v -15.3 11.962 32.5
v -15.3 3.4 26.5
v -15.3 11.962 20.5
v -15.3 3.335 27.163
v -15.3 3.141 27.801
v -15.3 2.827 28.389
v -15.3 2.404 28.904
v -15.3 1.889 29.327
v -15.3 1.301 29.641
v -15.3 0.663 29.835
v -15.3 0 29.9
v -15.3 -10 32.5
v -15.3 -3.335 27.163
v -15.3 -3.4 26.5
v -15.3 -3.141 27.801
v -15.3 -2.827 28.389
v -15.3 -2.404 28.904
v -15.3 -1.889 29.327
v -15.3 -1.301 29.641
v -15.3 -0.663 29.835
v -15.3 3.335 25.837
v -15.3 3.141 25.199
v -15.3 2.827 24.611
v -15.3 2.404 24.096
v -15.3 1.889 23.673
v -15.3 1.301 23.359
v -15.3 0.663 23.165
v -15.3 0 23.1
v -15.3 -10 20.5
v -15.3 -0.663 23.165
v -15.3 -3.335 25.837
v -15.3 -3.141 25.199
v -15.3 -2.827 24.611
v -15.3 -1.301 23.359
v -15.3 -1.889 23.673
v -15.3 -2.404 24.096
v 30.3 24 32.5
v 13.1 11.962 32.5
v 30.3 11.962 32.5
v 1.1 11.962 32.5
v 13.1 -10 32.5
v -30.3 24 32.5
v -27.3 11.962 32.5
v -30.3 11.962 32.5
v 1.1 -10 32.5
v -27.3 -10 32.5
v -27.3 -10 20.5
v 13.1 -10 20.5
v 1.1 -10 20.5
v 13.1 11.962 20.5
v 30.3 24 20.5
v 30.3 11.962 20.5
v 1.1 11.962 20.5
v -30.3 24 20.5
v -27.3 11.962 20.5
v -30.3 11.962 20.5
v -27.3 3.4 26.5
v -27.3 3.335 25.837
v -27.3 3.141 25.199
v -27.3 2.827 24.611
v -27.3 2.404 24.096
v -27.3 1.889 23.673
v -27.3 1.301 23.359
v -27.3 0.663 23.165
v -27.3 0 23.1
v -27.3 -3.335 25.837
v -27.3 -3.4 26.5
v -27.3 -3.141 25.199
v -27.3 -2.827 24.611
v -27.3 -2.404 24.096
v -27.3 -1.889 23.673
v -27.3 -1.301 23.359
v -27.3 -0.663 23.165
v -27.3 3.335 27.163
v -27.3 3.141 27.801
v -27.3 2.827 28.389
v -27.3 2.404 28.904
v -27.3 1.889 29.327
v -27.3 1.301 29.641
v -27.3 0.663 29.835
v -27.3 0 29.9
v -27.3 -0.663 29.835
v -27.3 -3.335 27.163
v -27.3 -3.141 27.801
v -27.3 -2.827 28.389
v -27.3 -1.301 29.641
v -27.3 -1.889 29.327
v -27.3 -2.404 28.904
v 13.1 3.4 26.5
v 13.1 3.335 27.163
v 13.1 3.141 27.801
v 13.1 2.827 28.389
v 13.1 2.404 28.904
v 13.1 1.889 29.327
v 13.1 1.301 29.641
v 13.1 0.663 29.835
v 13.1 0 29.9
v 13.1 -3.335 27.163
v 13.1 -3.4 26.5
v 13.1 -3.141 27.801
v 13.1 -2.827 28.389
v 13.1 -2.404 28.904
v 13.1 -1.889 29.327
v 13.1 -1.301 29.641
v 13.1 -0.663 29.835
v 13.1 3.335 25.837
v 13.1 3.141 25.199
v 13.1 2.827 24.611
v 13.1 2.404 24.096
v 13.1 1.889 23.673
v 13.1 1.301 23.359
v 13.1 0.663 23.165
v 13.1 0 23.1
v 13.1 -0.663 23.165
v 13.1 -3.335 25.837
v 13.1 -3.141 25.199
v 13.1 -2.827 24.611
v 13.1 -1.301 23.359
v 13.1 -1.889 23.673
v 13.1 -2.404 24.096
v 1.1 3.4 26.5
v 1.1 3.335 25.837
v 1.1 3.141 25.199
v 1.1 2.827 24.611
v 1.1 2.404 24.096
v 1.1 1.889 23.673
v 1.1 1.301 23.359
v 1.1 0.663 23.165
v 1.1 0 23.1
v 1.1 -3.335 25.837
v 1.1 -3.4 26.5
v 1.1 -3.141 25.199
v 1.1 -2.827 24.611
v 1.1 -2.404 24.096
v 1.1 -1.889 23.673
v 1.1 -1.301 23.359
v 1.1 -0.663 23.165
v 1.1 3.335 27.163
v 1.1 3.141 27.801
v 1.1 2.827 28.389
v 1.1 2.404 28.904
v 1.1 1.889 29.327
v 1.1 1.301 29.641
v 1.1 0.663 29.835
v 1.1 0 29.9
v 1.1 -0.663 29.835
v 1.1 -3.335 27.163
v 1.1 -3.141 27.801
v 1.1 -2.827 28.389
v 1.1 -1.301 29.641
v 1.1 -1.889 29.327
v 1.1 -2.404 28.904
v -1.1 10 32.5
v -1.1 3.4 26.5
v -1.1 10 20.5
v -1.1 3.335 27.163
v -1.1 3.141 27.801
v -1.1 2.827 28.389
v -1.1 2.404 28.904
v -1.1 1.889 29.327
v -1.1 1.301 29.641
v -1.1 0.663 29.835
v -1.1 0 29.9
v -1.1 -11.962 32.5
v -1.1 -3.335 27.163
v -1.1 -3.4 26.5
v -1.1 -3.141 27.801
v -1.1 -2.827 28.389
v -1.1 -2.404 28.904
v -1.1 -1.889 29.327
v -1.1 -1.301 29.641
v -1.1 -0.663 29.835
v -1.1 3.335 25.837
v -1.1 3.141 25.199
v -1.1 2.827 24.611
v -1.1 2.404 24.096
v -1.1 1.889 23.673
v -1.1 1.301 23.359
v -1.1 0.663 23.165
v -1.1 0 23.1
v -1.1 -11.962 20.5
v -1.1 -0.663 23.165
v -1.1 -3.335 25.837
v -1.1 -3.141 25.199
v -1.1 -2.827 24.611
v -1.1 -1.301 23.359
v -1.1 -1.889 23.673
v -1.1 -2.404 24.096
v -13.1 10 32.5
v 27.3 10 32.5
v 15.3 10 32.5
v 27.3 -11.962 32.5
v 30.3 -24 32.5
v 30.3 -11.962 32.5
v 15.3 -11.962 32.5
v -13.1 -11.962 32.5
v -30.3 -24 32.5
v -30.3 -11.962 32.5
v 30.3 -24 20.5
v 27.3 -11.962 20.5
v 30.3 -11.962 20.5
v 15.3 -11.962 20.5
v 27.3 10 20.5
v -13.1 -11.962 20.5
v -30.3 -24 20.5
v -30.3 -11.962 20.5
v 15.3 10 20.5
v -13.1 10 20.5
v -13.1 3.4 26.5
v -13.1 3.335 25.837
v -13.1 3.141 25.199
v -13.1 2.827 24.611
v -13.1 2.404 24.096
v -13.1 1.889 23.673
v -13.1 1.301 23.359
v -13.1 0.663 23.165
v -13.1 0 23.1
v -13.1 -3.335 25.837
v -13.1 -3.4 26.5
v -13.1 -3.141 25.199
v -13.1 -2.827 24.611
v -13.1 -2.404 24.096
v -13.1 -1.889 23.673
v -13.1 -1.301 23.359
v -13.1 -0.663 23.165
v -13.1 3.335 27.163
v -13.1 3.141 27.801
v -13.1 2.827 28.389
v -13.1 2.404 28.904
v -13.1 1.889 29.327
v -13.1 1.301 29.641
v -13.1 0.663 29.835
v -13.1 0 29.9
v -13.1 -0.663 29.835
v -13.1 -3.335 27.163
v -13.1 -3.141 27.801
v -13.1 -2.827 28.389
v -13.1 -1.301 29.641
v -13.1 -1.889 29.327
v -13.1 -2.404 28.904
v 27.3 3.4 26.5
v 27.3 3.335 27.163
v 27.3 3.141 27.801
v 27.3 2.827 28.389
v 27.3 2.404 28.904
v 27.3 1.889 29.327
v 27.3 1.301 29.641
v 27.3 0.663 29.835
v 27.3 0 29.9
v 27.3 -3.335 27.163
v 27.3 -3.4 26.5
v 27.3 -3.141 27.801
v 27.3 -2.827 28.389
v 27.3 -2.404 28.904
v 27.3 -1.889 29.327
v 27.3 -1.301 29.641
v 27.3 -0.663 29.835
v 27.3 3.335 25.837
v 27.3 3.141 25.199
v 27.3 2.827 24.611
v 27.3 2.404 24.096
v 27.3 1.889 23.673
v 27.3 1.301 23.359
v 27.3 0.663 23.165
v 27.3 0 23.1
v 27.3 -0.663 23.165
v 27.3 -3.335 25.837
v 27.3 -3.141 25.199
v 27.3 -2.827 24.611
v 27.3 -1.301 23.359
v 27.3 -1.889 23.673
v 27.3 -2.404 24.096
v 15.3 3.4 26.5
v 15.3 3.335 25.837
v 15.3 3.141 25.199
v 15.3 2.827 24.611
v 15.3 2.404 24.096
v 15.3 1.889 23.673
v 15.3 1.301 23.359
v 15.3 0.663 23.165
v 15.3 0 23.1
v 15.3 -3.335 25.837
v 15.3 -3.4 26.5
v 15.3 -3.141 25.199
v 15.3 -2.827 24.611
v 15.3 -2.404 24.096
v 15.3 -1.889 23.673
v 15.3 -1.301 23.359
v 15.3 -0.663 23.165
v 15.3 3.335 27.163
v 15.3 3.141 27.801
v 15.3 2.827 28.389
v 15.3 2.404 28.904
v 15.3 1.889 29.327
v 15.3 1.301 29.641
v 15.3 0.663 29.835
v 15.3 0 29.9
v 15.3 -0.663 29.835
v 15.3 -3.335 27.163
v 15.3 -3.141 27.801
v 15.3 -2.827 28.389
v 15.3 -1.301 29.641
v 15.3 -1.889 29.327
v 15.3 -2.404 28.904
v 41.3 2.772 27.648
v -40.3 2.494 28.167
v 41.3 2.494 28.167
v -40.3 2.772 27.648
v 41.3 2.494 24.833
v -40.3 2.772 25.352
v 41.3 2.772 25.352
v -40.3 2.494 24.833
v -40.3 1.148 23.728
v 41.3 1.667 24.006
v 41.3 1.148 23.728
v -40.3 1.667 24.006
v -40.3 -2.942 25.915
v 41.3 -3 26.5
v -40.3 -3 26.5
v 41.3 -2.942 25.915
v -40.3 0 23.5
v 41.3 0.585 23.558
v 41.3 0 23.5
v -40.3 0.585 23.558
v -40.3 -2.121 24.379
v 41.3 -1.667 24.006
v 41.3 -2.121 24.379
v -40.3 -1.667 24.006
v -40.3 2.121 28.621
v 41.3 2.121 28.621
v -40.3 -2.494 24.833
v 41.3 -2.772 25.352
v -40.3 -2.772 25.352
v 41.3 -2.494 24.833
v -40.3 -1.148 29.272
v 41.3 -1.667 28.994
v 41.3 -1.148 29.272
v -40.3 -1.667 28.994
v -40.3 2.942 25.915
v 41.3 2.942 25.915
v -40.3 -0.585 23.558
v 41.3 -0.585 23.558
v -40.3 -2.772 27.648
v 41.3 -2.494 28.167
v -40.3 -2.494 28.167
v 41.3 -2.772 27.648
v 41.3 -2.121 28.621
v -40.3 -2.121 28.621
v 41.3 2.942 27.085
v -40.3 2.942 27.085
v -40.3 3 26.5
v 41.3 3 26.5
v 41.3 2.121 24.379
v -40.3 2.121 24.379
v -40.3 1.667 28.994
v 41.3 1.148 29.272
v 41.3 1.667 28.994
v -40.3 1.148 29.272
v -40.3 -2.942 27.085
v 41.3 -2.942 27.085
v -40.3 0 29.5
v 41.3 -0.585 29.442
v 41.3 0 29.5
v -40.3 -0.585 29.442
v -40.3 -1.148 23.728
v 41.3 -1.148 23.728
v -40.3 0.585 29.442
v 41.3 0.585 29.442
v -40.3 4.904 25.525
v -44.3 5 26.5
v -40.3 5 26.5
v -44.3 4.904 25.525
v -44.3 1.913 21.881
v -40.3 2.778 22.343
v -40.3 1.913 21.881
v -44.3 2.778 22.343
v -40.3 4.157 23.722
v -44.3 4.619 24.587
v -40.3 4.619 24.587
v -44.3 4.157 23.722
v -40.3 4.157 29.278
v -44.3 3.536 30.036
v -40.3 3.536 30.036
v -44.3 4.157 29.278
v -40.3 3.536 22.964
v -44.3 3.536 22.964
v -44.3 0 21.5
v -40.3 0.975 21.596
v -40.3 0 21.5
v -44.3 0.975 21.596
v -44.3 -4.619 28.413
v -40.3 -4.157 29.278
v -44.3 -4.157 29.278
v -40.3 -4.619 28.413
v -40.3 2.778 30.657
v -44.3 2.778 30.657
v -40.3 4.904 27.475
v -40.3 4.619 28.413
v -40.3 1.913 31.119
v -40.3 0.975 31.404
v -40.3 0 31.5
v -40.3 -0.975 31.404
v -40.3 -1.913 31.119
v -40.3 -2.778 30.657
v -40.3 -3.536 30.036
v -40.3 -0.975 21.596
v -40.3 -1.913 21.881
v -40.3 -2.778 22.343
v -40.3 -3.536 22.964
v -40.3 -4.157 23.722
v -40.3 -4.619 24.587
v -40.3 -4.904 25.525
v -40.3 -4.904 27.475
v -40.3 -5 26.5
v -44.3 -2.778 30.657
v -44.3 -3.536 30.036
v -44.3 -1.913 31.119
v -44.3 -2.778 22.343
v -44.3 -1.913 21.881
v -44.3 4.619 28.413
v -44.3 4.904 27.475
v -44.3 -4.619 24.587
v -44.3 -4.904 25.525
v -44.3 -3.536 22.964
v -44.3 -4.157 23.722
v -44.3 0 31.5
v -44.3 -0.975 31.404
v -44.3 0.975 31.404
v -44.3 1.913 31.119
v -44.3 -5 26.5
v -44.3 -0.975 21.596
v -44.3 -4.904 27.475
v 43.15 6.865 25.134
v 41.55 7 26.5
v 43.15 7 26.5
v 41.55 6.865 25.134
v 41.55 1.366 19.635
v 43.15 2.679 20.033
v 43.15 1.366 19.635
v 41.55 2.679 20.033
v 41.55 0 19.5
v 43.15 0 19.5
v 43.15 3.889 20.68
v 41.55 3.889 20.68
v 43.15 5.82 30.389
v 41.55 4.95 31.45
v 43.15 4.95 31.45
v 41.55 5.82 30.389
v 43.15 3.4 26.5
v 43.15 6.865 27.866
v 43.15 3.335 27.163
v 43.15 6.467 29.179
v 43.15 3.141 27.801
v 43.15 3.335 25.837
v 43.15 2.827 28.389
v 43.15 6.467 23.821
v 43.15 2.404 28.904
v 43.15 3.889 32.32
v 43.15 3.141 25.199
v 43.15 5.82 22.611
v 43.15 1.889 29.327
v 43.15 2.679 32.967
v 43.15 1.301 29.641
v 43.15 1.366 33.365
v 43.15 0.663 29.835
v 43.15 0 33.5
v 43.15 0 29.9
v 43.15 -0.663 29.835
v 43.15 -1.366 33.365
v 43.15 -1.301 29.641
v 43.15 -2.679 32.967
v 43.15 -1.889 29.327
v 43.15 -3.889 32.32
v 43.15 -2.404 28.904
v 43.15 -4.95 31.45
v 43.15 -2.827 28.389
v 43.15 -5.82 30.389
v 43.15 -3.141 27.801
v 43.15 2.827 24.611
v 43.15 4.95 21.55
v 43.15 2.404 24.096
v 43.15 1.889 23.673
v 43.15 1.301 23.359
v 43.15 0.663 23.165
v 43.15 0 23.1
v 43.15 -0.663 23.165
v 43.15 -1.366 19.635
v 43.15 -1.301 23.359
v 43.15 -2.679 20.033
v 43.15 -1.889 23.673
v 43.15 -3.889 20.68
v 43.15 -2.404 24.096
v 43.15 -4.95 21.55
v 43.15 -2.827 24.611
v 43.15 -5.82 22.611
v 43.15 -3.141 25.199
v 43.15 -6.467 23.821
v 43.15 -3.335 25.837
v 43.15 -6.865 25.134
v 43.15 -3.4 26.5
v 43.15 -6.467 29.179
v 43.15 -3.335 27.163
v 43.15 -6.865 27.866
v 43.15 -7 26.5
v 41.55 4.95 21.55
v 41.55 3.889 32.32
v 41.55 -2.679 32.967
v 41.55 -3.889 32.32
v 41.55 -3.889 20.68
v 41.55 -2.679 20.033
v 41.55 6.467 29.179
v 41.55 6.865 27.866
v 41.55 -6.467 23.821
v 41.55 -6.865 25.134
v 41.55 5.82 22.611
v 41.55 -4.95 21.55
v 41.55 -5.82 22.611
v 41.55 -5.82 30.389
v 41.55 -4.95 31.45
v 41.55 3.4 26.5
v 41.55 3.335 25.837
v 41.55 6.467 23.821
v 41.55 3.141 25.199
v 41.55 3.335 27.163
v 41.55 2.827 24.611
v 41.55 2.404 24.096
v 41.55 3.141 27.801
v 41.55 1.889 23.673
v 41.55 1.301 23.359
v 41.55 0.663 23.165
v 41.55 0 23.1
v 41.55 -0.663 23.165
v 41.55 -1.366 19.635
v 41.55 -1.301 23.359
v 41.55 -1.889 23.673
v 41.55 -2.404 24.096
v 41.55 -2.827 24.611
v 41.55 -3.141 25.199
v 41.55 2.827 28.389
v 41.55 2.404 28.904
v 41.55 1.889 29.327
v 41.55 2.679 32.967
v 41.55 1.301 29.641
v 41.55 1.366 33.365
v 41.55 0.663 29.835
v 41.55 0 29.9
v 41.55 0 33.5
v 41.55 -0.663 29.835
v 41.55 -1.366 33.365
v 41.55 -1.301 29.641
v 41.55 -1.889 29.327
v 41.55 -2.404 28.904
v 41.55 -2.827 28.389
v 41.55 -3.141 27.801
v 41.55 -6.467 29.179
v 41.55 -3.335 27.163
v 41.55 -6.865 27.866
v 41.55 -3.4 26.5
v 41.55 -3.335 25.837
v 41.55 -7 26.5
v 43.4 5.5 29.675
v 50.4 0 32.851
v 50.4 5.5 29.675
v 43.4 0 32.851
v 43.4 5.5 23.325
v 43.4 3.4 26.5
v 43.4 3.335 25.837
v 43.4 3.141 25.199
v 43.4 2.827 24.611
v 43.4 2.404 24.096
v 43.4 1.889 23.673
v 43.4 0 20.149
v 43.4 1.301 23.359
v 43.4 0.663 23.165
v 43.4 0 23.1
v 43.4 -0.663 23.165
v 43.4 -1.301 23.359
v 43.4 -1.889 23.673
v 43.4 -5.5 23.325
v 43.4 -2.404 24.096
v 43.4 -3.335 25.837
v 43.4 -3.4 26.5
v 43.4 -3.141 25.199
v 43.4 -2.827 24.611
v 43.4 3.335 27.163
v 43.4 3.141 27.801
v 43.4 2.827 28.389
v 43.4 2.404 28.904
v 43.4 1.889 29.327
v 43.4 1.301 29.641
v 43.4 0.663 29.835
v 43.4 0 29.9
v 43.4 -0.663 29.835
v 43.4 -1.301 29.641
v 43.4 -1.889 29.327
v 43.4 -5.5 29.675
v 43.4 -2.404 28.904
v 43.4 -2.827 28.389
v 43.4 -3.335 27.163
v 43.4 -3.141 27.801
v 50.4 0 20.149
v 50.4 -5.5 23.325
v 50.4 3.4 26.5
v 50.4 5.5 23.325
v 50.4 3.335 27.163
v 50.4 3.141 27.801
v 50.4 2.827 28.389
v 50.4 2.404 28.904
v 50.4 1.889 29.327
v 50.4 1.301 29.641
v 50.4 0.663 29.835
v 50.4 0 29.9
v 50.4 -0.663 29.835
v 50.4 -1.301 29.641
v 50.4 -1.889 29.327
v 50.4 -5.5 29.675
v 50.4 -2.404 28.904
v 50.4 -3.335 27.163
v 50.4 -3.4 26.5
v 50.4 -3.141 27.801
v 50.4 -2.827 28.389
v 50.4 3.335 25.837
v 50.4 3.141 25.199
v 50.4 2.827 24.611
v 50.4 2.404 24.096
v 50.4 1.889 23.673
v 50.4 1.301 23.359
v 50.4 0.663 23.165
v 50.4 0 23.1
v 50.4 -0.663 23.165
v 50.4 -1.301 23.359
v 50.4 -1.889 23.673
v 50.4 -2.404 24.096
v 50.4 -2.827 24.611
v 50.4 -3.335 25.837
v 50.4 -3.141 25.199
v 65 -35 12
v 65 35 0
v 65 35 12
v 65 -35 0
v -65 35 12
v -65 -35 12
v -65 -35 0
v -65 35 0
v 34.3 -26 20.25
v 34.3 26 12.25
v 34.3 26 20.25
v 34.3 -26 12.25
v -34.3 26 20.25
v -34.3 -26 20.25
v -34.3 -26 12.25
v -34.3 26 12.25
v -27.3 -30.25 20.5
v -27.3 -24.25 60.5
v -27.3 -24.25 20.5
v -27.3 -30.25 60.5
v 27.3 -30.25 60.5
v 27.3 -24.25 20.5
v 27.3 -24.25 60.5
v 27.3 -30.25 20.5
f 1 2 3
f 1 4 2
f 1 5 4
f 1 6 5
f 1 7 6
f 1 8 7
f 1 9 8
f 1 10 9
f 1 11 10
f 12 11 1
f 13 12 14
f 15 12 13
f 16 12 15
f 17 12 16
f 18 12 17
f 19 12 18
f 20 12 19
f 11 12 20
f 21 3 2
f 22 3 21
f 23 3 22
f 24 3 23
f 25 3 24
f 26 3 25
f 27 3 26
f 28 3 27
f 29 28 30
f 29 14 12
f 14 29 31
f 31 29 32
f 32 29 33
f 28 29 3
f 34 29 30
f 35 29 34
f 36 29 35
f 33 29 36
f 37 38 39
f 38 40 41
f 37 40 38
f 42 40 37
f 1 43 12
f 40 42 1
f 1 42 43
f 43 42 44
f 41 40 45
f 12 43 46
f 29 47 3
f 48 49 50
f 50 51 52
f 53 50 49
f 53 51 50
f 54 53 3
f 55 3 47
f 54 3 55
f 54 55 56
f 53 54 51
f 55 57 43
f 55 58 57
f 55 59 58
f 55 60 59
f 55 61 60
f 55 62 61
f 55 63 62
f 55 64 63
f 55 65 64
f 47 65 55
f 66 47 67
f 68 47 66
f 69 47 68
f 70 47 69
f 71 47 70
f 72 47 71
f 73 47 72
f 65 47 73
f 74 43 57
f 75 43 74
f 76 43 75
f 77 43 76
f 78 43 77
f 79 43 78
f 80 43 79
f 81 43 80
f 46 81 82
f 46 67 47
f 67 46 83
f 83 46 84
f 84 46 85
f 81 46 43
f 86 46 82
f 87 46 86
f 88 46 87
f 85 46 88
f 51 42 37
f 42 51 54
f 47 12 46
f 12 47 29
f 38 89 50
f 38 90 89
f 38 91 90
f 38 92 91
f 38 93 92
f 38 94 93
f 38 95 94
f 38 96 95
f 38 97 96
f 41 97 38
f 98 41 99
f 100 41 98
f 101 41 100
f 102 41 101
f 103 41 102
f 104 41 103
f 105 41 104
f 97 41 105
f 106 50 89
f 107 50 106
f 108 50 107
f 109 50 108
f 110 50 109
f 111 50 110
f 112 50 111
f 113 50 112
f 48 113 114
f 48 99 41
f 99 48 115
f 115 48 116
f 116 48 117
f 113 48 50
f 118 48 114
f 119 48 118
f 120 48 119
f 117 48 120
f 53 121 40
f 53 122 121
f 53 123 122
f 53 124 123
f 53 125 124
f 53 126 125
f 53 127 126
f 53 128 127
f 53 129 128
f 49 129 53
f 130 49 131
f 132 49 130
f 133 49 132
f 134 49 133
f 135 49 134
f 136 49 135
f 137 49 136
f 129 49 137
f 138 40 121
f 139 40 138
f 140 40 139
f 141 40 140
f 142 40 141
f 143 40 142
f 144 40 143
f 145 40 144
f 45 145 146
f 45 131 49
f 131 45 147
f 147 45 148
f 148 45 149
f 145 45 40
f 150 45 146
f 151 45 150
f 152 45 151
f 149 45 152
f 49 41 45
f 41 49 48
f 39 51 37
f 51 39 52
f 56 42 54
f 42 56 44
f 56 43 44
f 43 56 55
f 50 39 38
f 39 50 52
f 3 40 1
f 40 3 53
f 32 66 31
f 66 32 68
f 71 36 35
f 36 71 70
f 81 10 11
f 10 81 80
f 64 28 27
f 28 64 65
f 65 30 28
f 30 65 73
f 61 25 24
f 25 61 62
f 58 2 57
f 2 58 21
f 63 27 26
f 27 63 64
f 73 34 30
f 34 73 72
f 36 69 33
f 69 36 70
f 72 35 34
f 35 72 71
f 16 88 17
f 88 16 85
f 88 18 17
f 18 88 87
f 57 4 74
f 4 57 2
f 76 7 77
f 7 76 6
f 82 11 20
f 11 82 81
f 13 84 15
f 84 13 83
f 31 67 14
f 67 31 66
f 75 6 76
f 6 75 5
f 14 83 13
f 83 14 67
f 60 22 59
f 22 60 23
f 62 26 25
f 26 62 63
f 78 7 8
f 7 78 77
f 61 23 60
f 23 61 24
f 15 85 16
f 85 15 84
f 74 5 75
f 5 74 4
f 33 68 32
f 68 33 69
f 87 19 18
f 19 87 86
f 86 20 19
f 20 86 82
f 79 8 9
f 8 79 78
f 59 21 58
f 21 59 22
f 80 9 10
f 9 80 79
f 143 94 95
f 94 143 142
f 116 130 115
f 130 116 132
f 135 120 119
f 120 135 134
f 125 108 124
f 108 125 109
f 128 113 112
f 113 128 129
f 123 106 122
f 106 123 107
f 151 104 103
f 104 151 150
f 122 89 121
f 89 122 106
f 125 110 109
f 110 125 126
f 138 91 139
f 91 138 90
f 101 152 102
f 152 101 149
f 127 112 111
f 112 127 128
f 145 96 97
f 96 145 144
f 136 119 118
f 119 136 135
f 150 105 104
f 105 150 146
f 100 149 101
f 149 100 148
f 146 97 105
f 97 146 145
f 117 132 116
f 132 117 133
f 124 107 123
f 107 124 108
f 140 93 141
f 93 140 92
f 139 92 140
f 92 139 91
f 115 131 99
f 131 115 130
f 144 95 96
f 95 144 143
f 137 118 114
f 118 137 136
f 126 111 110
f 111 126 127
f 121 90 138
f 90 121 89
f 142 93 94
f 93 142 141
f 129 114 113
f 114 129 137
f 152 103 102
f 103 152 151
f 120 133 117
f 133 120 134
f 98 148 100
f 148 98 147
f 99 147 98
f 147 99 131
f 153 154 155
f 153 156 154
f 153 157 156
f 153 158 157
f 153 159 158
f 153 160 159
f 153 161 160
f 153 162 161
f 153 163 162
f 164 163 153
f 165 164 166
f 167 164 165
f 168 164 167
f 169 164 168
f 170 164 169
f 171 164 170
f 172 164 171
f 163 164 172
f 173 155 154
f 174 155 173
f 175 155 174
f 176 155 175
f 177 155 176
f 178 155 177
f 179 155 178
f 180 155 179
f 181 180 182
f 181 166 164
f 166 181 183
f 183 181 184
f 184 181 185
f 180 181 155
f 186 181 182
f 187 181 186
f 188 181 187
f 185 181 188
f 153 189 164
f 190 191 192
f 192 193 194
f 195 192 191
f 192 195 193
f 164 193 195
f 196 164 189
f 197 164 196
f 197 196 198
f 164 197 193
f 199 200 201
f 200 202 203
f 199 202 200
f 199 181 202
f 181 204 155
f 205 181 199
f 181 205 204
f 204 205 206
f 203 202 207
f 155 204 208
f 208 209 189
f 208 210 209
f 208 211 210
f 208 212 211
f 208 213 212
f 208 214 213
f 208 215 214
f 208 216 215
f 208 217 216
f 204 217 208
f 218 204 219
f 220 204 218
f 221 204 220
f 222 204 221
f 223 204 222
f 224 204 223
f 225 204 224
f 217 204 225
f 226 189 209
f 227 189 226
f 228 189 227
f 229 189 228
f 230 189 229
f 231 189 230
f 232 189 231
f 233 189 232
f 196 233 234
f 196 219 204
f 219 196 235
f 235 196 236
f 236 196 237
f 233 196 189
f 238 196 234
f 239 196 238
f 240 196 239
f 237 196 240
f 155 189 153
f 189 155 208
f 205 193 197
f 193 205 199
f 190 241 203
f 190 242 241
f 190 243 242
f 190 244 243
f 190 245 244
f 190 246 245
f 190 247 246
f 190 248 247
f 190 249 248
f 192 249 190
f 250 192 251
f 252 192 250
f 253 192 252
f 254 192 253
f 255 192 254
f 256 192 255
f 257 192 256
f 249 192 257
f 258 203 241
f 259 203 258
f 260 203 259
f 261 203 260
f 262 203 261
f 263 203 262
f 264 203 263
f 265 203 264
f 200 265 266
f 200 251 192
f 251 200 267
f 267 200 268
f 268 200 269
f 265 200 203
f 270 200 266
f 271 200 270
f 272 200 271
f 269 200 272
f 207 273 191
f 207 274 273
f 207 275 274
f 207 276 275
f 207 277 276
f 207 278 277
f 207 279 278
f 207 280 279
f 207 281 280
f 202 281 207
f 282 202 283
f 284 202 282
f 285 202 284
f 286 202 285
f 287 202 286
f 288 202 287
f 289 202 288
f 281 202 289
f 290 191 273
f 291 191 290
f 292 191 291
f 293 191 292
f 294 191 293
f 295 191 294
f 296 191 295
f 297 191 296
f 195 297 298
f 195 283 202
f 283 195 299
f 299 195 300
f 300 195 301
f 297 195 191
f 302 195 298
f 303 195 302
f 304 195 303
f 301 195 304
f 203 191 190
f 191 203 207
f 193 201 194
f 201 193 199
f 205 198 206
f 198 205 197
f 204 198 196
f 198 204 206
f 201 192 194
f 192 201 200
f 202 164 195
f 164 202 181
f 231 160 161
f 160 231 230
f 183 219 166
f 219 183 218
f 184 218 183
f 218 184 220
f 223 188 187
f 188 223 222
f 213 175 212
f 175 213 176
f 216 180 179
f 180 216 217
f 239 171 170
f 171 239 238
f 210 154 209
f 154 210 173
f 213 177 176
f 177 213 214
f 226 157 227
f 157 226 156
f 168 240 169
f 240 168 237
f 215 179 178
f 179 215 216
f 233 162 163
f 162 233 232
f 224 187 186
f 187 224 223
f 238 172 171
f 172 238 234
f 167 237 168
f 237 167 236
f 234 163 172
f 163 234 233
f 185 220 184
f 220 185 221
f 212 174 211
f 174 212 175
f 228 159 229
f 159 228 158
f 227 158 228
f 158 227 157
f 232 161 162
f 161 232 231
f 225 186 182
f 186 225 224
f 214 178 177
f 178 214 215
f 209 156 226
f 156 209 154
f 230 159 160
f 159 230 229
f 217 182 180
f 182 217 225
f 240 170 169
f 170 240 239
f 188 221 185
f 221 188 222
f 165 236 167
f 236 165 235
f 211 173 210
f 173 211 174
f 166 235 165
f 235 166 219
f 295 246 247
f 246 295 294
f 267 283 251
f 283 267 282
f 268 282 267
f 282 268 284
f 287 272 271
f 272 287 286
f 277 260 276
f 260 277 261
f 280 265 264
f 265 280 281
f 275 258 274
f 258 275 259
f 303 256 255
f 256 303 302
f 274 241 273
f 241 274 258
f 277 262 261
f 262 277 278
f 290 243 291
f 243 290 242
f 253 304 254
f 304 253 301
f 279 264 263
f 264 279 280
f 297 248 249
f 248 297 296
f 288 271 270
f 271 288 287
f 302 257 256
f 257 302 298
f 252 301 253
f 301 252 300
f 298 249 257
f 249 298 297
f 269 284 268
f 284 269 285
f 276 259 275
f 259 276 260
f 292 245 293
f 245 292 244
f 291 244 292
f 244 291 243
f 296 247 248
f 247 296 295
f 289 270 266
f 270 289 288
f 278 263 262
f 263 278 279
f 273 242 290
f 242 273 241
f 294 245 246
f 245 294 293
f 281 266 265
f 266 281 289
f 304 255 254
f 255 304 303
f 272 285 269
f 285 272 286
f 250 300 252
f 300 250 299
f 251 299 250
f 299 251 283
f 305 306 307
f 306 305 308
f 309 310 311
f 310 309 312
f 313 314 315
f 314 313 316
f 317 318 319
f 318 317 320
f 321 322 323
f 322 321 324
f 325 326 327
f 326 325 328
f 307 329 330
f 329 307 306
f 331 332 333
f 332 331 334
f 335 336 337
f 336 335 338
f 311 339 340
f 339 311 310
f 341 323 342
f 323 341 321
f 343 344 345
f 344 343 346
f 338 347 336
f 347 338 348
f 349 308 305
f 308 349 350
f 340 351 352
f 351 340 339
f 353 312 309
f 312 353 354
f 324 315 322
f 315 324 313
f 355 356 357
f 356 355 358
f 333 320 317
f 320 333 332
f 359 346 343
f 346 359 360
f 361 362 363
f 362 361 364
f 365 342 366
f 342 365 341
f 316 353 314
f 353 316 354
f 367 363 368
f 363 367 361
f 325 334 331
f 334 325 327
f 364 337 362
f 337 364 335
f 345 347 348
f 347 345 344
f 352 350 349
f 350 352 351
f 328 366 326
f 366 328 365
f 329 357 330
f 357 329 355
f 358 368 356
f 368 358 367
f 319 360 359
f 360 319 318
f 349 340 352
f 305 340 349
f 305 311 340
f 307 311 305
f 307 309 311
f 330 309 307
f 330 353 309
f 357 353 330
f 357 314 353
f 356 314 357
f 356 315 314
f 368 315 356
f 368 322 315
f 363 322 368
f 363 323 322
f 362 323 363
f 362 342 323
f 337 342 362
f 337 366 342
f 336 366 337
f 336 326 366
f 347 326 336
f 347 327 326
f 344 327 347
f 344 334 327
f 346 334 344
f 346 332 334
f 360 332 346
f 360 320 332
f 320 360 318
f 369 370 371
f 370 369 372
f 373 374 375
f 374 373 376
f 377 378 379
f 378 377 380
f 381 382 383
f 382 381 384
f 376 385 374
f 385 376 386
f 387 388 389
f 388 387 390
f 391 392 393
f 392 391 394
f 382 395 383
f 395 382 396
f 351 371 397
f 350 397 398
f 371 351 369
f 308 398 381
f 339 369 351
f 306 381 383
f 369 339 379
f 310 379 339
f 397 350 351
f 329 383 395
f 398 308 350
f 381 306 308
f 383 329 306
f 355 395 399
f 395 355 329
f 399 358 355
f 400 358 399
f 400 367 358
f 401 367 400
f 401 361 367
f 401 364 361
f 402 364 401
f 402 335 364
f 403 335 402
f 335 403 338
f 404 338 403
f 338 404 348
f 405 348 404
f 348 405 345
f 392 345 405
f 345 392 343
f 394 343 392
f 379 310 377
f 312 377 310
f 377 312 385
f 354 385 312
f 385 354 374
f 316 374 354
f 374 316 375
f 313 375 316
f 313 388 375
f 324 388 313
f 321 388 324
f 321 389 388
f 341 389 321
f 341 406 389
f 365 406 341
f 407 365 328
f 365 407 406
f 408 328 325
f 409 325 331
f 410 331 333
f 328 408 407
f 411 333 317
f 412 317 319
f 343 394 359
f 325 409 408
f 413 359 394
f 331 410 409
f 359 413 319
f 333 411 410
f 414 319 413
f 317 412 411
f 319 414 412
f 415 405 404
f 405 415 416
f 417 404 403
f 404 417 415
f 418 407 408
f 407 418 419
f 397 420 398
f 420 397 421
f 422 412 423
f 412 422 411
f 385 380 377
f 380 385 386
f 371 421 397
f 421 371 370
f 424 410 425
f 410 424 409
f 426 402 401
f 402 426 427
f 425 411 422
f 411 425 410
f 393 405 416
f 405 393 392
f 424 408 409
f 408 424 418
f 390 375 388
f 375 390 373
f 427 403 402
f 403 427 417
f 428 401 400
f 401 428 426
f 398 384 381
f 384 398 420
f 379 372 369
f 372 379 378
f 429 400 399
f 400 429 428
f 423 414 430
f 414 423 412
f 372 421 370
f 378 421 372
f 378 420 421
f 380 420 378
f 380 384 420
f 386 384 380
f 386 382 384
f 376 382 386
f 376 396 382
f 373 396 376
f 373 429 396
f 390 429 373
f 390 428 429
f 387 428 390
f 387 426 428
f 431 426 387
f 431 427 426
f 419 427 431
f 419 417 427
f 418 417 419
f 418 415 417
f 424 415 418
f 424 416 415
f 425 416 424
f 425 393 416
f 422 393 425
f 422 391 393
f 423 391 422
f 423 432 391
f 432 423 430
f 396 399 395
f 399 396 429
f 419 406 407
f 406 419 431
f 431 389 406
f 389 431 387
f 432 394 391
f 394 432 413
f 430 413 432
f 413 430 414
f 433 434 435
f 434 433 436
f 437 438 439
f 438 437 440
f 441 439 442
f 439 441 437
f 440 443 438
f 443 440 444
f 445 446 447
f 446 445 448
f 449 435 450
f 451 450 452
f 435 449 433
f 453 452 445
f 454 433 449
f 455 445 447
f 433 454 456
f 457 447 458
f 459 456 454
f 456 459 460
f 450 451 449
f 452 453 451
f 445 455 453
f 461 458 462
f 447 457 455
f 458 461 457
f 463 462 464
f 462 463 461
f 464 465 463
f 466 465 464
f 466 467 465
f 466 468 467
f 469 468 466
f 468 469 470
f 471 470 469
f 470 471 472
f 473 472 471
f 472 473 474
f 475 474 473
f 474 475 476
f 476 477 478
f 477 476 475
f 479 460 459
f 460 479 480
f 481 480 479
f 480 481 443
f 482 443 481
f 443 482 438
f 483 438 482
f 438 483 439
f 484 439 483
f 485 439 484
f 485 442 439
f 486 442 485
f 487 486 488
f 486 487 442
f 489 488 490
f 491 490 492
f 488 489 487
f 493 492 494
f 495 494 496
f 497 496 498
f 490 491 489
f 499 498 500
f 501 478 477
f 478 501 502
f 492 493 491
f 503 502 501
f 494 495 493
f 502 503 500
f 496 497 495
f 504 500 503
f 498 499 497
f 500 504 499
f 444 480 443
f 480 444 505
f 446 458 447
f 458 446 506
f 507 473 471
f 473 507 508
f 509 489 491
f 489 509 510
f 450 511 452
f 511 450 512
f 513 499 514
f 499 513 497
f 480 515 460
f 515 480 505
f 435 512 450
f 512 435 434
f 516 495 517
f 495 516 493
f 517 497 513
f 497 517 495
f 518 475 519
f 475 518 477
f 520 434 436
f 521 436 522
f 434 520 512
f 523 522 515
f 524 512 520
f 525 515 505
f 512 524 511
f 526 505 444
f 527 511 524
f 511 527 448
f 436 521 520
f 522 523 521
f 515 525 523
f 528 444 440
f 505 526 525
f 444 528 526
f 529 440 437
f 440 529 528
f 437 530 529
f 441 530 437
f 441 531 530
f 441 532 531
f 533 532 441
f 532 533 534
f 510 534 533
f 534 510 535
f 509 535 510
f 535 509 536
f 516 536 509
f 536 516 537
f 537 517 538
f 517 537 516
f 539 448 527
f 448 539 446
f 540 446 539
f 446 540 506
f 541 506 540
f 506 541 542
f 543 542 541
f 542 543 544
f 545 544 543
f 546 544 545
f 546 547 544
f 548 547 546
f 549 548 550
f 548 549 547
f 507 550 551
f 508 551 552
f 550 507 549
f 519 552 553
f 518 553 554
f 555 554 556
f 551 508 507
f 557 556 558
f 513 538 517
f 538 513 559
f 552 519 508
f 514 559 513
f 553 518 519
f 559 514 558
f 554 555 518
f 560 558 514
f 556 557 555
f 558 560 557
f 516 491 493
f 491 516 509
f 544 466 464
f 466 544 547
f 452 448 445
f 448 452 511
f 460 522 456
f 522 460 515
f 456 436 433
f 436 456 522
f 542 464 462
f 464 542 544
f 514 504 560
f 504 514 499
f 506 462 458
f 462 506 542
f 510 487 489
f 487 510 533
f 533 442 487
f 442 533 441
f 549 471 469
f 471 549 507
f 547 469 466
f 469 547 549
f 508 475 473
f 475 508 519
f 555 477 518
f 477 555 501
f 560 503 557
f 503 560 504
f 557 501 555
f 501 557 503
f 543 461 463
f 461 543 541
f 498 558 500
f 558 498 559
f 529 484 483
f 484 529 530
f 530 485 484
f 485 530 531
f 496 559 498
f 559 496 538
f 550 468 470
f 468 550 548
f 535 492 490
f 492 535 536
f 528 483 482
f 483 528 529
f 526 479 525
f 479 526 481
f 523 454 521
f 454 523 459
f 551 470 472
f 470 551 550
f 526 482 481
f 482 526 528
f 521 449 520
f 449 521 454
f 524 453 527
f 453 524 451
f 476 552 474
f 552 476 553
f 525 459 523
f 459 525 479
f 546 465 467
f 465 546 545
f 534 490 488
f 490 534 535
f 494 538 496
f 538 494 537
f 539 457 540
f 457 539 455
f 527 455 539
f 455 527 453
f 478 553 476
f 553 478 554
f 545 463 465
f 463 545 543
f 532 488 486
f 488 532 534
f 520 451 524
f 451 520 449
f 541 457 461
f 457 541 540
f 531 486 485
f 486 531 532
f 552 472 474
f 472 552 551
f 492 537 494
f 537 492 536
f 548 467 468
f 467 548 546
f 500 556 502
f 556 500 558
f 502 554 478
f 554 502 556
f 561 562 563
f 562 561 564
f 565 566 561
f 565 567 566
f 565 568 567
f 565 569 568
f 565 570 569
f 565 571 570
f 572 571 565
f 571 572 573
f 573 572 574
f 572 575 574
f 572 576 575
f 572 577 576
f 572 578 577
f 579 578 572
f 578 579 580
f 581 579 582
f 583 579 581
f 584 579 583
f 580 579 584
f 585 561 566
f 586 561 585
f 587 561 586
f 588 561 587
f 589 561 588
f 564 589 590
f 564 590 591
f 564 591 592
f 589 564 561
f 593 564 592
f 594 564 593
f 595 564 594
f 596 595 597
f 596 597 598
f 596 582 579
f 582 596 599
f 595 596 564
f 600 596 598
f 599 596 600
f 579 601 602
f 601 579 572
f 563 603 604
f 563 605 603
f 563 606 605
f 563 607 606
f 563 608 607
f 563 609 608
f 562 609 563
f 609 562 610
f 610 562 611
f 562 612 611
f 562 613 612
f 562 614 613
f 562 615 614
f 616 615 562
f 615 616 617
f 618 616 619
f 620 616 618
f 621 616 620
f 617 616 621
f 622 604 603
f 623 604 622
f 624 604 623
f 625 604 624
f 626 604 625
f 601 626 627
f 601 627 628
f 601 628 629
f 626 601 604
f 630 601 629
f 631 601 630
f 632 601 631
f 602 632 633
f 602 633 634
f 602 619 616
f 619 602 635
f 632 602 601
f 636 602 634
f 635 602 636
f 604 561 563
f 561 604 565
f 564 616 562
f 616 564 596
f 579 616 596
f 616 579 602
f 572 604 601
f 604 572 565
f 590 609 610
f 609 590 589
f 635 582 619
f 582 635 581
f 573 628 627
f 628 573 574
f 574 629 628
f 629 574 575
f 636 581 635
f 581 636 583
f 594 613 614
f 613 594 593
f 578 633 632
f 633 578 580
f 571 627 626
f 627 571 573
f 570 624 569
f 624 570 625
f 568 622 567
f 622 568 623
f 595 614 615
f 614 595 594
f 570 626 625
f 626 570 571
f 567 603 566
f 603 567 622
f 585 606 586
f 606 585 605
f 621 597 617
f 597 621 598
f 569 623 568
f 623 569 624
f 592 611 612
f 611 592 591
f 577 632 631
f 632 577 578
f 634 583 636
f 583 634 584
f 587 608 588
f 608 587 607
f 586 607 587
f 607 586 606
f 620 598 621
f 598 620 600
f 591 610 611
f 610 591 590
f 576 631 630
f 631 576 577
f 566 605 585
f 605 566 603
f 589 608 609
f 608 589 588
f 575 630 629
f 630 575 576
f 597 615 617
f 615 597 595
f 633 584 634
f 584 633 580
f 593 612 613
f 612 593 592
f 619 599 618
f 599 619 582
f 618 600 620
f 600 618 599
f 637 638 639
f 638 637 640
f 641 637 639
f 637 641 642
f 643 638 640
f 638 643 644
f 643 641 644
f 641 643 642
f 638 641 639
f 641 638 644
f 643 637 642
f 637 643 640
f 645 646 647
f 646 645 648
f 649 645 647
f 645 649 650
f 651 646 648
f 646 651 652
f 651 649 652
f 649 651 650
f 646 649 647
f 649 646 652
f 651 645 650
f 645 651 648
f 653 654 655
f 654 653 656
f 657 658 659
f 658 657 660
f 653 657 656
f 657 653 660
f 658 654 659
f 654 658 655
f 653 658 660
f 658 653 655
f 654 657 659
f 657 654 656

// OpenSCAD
$fn = 32;

// ------------------------------------------------------------------------
// Comb hinge with flap: leaf 60.6 x 24 mm, pin d6, flap 40 mm
// Every part is its own module, assembly() places every instance.
// ------------------------------------------------------------------------

// --- part 1 ---
module hinge_bed() {
  difference() {
    translate([-65, -35, 0]) cube([130, 70, 12]);
  }
}

// --- part 2 ---
module hinge_riser() {
  difference() {
    translate([-34.3, -26, 0]) cube([68.6, 52, 8]);
  }
}

// --- part 3 ---
module hinge_leaf_a() {
  difference() {
    union() {
      translate([-27.3, -10, -6]) cube([12, 34, 12]);
      translate([1.1, -10, -6]) cube([12, 34, 12]);
      translate([-30.3, 11.962, -6]) cube([60.6, 12.038, 12]);
    }
    translate([-21.3, 0, 0]) rotate([0, 90, 0]) cylinder(h = 14, d = 6.8, center = true);
    translate([7.1, 0, 0]) rotate([0, 90, 0]) cylinder(h = 14, d = 6.8, center = true);
  }
}

// --- part 4 ---
module hinge_leaf_b() {
  difference() {
    union() {
      translate([-13.1, -24, -6]) cube([12, 34, 12]);
      translate([15.3, -24, -6]) cube([12, 34, 12]);
      translate([-30.3, -24, -6]) cube([60.6, 12.038, 12]);
    }
    translate([-7.1, 0, 0]) rotate([0, 90, 0]) cylinder(h = 14, d = 6.8, center = true);
    translate([21.3, 0, 0]) rotate([0, 90, 0]) cylinder(h = 14, d = 6.8, center = true);
  }
}

// --- part 5 ---
module hinge_flap() {
  difference() {
    translate([-27.3, -20, 0]) cube([54.6, 40, 6]);
  }
}

// --- part 6 ---
module hinge_pin() {
  rotate([0, 90, 0]) cylinder(h = 82.6, d = 6, center = true);
  translate([-44.3, 0, 0]) rotate([0, 90, 0]) cylinder(h = 4, d = 10);
}

// --- part 7 ---
module pin_washer() {
  difference() {
      translate([0, 0, 0]) cylinder(h = 1.6, d = 14);
      translate([0, 0, -1]) cylinder(h = 3.6, d = 6.8);
    }
}

// --- part 8 ---
module pin_nut() {
  difference() {
    linear_extrude(height = 7) polygon(points = [[6.351, 0], [3.175, 5.5], [-3.175, 5.5], [-6.351, 0], [-3.175, -5.5], [3.175, -5.5]]);
    translate([0, 0, -1]) cylinder(h = 9, d = 6.8);
  }
}

// --- assembly ---
module assembly() {
  color([0.80, 0.24, 0.20]) translate([0, 0, 0]) rotate([0, 0, 0]) hinge_bed();
  color([0.20, 0.45, 0.75]) translate([0, 0, 12.25]) rotate([0, 0, 0]) hinge_riser();
  color([0.25, 0.62, 0.32]) translate([0, 0, 26.5]) rotate([0, 0, 0]) hinge_leaf_a();
  color([0.92, 0.70, 0.18]) translate([0, 0, 26.5]) rotate([0, 0, 0]) hinge_leaf_b();
  color([0.58, 0.35, 0.70]) translate([0, -24.25, 40.5]) rotate([90, 0, 0]) hinge_flap();
  color([0.16, 0.66, 0.66]) translate([0, 0, 26.5]) rotate([0, 0, 0]) hinge_pin();
  color([0.85, 0.48, 0.18]) translate([41.55, 0, 26.5]) rotate([0, 90, 0]) pin_washer();
  color([0.55, 0.60, 0.65]) translate([43.4, 0, 26.5]) rotate([0, 90, 0]) pin_nut();
}

assembly();
